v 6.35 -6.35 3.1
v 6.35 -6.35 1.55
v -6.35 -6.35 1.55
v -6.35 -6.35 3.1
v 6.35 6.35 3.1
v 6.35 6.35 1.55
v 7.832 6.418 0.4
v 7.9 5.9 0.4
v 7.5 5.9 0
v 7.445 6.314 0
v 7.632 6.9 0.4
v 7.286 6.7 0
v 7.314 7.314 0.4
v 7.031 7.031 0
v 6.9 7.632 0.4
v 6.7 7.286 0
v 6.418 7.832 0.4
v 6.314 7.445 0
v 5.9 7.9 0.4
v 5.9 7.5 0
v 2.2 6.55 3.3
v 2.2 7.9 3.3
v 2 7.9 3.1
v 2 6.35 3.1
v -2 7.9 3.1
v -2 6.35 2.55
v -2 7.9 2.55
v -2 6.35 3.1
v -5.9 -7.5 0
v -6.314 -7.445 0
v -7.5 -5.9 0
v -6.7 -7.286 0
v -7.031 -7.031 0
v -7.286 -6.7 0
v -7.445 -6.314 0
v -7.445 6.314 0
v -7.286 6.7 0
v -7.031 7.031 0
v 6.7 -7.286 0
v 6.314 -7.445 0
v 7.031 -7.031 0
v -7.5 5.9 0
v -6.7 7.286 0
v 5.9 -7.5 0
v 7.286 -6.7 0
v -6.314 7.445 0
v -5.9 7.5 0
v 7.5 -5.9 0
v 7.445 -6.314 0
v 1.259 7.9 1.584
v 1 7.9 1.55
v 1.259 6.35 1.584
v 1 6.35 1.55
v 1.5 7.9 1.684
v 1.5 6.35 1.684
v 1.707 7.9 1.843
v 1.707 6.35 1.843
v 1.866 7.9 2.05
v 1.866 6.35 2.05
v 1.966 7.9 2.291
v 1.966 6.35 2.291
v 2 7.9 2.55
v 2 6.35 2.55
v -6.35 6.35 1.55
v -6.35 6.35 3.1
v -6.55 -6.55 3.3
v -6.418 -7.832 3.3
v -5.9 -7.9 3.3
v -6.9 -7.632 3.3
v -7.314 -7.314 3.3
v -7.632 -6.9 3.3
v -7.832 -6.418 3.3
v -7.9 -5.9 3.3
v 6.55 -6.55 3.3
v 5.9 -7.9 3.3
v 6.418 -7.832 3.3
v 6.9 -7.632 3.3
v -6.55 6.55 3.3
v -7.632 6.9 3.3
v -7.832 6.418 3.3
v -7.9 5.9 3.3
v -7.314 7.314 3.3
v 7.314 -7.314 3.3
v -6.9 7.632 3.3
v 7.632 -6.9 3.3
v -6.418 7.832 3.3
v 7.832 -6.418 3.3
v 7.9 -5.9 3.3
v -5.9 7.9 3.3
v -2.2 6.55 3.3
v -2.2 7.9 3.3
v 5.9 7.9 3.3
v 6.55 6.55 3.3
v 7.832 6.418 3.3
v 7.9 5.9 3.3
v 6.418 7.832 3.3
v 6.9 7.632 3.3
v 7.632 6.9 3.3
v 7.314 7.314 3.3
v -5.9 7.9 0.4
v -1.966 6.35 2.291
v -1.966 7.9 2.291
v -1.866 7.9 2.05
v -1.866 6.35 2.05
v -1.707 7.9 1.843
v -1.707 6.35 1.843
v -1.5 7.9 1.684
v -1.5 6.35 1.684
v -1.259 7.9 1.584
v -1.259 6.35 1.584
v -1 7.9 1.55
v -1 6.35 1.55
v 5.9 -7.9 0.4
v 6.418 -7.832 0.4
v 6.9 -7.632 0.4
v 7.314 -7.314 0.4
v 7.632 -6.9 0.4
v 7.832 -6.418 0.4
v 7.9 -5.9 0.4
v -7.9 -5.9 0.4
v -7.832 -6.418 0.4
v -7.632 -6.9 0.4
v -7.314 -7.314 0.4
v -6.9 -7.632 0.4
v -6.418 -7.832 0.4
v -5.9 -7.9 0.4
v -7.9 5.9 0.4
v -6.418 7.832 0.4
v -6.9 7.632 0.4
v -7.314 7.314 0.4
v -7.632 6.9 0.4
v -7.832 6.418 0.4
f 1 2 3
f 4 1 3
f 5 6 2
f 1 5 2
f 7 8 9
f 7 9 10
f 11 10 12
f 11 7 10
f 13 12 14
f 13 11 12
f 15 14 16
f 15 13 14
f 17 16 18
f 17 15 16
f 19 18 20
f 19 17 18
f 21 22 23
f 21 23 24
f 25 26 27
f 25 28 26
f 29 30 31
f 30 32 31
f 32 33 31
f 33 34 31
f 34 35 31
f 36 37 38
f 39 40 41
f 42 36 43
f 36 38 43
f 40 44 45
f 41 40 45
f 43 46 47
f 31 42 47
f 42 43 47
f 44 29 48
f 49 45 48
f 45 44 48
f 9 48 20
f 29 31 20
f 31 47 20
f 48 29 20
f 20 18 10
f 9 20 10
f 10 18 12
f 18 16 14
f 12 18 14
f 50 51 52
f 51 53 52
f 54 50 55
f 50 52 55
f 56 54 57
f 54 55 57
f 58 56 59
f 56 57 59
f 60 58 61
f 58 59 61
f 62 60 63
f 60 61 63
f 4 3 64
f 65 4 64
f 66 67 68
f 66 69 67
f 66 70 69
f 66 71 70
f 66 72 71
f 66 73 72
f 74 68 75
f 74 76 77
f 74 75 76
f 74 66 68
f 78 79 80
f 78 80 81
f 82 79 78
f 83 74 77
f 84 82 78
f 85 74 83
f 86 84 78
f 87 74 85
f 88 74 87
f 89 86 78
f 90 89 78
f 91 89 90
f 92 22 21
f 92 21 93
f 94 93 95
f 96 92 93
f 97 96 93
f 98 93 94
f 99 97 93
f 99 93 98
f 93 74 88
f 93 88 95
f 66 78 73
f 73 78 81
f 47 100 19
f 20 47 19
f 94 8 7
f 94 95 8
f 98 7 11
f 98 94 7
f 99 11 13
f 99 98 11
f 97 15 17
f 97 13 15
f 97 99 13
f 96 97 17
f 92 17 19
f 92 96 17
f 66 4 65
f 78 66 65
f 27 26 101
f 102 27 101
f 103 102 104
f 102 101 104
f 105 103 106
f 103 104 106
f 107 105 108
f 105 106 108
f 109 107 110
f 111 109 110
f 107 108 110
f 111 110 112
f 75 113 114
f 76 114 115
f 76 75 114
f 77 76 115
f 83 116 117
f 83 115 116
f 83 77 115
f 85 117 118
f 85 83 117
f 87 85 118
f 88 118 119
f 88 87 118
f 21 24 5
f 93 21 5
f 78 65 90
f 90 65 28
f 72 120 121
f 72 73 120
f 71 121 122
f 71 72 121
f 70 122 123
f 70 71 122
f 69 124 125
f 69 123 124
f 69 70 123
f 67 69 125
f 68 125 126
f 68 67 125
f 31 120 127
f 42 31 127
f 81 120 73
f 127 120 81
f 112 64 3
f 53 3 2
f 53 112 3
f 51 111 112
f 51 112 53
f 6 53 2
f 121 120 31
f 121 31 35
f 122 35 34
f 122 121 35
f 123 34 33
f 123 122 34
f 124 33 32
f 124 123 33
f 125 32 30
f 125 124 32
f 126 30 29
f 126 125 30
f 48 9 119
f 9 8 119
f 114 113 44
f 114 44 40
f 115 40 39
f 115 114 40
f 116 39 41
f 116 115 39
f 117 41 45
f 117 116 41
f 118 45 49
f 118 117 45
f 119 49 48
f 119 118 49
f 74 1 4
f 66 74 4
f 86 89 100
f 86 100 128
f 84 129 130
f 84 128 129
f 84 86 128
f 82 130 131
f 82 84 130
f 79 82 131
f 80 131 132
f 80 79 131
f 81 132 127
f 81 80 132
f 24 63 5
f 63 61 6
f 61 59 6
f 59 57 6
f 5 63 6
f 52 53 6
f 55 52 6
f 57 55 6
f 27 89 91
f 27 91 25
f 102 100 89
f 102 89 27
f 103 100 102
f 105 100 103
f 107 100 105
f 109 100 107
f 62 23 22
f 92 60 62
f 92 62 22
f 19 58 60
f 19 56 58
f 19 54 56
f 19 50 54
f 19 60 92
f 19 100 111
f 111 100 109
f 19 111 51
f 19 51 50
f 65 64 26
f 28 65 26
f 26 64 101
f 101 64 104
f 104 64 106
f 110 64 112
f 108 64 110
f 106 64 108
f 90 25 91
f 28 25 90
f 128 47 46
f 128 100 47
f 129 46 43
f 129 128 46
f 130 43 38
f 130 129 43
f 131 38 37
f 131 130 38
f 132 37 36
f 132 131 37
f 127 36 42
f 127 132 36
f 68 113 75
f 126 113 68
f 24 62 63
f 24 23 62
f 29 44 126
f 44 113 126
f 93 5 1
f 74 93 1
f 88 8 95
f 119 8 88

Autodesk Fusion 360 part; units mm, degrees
sketch "Sketch1" plane through (0, 0, 0) normal (0, 0, 1) x (1, 0, 0)
  line L0 (-7.9, 7.9) -> (7.9, 7.9)
  line L1 (7.9, 7.9) -> (7.9, -7.9)
  line L2 (7.9, -7.9) -> (-7.9, -7.9)
  line L3 (-7.9, -7.9) -> (-7.9, 7.9)
  line L4 (-7.9, 7.9) -> (7.9, -7.9) construction
  line L5 (7.9, 7.9) -> (-7.9, -7.9) construction
  dimension "d1" = 15.8
extrude "Extrude1" add sketch "Sketch1" along normal blind 3.3
shell "Shell1" thickness 1.55 removed faces 1 at (-2.6333, 2.6333, 3.3)
fillet "Fillet1" radius 2 4 edges at (7.9, 7.9, 1.65) (7.9, -7.9, 1.65) (-7.9, -7.9, 1.65) (-7.9, 7.9, 1.65)
chamfer "Chamfer1" distance 0.4 angle 45 8 edges at (7.9, 0, 0) (7.3142, -7.3142, 0) (0, -7.9, 0) (-7.3142, -7.3142, 0) (-7.9, 0, 0) (-7.3142, 7.3142, 0) (0, 7.9, 0) (7.3142, 7.3142, 0)
chamfer "Chamfer2" distance 0.2 angle 45 4 edges at (-6.35, 0, 3.3) (0, 6.35, 3.3) (6.35, 0, 3.3) (0, -6.35, 3.3)
sketch "Sketch2" plane through (0, 0, 3.3) normal (0, 0, 1) x (1, 0, 0)
  arc A0 (-5.9, 7.9) -> (-7.9, 5.9) centre (-5.9, 5.9) ccw
  line L0 (-7.9, 5.9) -> (-7.9, -5.9)
  arc A1 (-7.9, -5.9) -> (-5.9, -7.9) centre (-5.9, -5.9) ccw
  line L1 (-5.9, -7.9) -> (5.9, -7.9)
  arc A2 (5.9, -7.9) -> (7.9, -5.9) centre (5.9, -5.9) ccw
  line L2 (7.9, -5.9) -> (7.9, 5.9)
  arc A3 (7.9, 5.9) -> (5.9, 7.9) centre (5.9, 5.9) ccw
  line L3 (5.9, 7.9) -> (-5.9, 7.9)
  line L4 (-6.55, -6.55) -> (-6.55, 6.55)
  line L5 (-6.55, 6.55) -> (6.55, 6.55)
  line L6 (6.55, 6.55) -> (6.55, -6.55)
  line L7 (6.55, -6.55) -> (-6.55, -6.55)
  line L8 (0, 0) -> (0, 7.9) construction
  line L9 (2, 6.0755) -> (-2, 6.0755)
  line L10 (-2, 6.0755) -> (-2, 9.7245)
  line L11 (-2, 9.7245) -> (2, 9.7245)
  line L12 (2, 9.7245) -> (2, 6.0755)
  line L13 (2, 6.0755) -> (-2, 9.7245) construction
  line L14 (-2, 6.0755) -> (2, 9.7245) construction
  point P0 (0, 7.9)
  dimension "d9" = 4
extrude "Extrude2" cut sketch "Sketch2" against normal up to surface (1.75 mm away) contours L3 L10 L11 L12 | L3 L5 L10 L12 | L5 L9 L10 L12
fillet "Fillet2" radius 1 2 edges at (-2, 7.125, 1.55) (2, 7.125, 1.55)
chamfer "Chamfer3" distance 0.2 angle 45 2 edges at (2, 7.225, 3.3) (-2, 7.225, 3.3)
